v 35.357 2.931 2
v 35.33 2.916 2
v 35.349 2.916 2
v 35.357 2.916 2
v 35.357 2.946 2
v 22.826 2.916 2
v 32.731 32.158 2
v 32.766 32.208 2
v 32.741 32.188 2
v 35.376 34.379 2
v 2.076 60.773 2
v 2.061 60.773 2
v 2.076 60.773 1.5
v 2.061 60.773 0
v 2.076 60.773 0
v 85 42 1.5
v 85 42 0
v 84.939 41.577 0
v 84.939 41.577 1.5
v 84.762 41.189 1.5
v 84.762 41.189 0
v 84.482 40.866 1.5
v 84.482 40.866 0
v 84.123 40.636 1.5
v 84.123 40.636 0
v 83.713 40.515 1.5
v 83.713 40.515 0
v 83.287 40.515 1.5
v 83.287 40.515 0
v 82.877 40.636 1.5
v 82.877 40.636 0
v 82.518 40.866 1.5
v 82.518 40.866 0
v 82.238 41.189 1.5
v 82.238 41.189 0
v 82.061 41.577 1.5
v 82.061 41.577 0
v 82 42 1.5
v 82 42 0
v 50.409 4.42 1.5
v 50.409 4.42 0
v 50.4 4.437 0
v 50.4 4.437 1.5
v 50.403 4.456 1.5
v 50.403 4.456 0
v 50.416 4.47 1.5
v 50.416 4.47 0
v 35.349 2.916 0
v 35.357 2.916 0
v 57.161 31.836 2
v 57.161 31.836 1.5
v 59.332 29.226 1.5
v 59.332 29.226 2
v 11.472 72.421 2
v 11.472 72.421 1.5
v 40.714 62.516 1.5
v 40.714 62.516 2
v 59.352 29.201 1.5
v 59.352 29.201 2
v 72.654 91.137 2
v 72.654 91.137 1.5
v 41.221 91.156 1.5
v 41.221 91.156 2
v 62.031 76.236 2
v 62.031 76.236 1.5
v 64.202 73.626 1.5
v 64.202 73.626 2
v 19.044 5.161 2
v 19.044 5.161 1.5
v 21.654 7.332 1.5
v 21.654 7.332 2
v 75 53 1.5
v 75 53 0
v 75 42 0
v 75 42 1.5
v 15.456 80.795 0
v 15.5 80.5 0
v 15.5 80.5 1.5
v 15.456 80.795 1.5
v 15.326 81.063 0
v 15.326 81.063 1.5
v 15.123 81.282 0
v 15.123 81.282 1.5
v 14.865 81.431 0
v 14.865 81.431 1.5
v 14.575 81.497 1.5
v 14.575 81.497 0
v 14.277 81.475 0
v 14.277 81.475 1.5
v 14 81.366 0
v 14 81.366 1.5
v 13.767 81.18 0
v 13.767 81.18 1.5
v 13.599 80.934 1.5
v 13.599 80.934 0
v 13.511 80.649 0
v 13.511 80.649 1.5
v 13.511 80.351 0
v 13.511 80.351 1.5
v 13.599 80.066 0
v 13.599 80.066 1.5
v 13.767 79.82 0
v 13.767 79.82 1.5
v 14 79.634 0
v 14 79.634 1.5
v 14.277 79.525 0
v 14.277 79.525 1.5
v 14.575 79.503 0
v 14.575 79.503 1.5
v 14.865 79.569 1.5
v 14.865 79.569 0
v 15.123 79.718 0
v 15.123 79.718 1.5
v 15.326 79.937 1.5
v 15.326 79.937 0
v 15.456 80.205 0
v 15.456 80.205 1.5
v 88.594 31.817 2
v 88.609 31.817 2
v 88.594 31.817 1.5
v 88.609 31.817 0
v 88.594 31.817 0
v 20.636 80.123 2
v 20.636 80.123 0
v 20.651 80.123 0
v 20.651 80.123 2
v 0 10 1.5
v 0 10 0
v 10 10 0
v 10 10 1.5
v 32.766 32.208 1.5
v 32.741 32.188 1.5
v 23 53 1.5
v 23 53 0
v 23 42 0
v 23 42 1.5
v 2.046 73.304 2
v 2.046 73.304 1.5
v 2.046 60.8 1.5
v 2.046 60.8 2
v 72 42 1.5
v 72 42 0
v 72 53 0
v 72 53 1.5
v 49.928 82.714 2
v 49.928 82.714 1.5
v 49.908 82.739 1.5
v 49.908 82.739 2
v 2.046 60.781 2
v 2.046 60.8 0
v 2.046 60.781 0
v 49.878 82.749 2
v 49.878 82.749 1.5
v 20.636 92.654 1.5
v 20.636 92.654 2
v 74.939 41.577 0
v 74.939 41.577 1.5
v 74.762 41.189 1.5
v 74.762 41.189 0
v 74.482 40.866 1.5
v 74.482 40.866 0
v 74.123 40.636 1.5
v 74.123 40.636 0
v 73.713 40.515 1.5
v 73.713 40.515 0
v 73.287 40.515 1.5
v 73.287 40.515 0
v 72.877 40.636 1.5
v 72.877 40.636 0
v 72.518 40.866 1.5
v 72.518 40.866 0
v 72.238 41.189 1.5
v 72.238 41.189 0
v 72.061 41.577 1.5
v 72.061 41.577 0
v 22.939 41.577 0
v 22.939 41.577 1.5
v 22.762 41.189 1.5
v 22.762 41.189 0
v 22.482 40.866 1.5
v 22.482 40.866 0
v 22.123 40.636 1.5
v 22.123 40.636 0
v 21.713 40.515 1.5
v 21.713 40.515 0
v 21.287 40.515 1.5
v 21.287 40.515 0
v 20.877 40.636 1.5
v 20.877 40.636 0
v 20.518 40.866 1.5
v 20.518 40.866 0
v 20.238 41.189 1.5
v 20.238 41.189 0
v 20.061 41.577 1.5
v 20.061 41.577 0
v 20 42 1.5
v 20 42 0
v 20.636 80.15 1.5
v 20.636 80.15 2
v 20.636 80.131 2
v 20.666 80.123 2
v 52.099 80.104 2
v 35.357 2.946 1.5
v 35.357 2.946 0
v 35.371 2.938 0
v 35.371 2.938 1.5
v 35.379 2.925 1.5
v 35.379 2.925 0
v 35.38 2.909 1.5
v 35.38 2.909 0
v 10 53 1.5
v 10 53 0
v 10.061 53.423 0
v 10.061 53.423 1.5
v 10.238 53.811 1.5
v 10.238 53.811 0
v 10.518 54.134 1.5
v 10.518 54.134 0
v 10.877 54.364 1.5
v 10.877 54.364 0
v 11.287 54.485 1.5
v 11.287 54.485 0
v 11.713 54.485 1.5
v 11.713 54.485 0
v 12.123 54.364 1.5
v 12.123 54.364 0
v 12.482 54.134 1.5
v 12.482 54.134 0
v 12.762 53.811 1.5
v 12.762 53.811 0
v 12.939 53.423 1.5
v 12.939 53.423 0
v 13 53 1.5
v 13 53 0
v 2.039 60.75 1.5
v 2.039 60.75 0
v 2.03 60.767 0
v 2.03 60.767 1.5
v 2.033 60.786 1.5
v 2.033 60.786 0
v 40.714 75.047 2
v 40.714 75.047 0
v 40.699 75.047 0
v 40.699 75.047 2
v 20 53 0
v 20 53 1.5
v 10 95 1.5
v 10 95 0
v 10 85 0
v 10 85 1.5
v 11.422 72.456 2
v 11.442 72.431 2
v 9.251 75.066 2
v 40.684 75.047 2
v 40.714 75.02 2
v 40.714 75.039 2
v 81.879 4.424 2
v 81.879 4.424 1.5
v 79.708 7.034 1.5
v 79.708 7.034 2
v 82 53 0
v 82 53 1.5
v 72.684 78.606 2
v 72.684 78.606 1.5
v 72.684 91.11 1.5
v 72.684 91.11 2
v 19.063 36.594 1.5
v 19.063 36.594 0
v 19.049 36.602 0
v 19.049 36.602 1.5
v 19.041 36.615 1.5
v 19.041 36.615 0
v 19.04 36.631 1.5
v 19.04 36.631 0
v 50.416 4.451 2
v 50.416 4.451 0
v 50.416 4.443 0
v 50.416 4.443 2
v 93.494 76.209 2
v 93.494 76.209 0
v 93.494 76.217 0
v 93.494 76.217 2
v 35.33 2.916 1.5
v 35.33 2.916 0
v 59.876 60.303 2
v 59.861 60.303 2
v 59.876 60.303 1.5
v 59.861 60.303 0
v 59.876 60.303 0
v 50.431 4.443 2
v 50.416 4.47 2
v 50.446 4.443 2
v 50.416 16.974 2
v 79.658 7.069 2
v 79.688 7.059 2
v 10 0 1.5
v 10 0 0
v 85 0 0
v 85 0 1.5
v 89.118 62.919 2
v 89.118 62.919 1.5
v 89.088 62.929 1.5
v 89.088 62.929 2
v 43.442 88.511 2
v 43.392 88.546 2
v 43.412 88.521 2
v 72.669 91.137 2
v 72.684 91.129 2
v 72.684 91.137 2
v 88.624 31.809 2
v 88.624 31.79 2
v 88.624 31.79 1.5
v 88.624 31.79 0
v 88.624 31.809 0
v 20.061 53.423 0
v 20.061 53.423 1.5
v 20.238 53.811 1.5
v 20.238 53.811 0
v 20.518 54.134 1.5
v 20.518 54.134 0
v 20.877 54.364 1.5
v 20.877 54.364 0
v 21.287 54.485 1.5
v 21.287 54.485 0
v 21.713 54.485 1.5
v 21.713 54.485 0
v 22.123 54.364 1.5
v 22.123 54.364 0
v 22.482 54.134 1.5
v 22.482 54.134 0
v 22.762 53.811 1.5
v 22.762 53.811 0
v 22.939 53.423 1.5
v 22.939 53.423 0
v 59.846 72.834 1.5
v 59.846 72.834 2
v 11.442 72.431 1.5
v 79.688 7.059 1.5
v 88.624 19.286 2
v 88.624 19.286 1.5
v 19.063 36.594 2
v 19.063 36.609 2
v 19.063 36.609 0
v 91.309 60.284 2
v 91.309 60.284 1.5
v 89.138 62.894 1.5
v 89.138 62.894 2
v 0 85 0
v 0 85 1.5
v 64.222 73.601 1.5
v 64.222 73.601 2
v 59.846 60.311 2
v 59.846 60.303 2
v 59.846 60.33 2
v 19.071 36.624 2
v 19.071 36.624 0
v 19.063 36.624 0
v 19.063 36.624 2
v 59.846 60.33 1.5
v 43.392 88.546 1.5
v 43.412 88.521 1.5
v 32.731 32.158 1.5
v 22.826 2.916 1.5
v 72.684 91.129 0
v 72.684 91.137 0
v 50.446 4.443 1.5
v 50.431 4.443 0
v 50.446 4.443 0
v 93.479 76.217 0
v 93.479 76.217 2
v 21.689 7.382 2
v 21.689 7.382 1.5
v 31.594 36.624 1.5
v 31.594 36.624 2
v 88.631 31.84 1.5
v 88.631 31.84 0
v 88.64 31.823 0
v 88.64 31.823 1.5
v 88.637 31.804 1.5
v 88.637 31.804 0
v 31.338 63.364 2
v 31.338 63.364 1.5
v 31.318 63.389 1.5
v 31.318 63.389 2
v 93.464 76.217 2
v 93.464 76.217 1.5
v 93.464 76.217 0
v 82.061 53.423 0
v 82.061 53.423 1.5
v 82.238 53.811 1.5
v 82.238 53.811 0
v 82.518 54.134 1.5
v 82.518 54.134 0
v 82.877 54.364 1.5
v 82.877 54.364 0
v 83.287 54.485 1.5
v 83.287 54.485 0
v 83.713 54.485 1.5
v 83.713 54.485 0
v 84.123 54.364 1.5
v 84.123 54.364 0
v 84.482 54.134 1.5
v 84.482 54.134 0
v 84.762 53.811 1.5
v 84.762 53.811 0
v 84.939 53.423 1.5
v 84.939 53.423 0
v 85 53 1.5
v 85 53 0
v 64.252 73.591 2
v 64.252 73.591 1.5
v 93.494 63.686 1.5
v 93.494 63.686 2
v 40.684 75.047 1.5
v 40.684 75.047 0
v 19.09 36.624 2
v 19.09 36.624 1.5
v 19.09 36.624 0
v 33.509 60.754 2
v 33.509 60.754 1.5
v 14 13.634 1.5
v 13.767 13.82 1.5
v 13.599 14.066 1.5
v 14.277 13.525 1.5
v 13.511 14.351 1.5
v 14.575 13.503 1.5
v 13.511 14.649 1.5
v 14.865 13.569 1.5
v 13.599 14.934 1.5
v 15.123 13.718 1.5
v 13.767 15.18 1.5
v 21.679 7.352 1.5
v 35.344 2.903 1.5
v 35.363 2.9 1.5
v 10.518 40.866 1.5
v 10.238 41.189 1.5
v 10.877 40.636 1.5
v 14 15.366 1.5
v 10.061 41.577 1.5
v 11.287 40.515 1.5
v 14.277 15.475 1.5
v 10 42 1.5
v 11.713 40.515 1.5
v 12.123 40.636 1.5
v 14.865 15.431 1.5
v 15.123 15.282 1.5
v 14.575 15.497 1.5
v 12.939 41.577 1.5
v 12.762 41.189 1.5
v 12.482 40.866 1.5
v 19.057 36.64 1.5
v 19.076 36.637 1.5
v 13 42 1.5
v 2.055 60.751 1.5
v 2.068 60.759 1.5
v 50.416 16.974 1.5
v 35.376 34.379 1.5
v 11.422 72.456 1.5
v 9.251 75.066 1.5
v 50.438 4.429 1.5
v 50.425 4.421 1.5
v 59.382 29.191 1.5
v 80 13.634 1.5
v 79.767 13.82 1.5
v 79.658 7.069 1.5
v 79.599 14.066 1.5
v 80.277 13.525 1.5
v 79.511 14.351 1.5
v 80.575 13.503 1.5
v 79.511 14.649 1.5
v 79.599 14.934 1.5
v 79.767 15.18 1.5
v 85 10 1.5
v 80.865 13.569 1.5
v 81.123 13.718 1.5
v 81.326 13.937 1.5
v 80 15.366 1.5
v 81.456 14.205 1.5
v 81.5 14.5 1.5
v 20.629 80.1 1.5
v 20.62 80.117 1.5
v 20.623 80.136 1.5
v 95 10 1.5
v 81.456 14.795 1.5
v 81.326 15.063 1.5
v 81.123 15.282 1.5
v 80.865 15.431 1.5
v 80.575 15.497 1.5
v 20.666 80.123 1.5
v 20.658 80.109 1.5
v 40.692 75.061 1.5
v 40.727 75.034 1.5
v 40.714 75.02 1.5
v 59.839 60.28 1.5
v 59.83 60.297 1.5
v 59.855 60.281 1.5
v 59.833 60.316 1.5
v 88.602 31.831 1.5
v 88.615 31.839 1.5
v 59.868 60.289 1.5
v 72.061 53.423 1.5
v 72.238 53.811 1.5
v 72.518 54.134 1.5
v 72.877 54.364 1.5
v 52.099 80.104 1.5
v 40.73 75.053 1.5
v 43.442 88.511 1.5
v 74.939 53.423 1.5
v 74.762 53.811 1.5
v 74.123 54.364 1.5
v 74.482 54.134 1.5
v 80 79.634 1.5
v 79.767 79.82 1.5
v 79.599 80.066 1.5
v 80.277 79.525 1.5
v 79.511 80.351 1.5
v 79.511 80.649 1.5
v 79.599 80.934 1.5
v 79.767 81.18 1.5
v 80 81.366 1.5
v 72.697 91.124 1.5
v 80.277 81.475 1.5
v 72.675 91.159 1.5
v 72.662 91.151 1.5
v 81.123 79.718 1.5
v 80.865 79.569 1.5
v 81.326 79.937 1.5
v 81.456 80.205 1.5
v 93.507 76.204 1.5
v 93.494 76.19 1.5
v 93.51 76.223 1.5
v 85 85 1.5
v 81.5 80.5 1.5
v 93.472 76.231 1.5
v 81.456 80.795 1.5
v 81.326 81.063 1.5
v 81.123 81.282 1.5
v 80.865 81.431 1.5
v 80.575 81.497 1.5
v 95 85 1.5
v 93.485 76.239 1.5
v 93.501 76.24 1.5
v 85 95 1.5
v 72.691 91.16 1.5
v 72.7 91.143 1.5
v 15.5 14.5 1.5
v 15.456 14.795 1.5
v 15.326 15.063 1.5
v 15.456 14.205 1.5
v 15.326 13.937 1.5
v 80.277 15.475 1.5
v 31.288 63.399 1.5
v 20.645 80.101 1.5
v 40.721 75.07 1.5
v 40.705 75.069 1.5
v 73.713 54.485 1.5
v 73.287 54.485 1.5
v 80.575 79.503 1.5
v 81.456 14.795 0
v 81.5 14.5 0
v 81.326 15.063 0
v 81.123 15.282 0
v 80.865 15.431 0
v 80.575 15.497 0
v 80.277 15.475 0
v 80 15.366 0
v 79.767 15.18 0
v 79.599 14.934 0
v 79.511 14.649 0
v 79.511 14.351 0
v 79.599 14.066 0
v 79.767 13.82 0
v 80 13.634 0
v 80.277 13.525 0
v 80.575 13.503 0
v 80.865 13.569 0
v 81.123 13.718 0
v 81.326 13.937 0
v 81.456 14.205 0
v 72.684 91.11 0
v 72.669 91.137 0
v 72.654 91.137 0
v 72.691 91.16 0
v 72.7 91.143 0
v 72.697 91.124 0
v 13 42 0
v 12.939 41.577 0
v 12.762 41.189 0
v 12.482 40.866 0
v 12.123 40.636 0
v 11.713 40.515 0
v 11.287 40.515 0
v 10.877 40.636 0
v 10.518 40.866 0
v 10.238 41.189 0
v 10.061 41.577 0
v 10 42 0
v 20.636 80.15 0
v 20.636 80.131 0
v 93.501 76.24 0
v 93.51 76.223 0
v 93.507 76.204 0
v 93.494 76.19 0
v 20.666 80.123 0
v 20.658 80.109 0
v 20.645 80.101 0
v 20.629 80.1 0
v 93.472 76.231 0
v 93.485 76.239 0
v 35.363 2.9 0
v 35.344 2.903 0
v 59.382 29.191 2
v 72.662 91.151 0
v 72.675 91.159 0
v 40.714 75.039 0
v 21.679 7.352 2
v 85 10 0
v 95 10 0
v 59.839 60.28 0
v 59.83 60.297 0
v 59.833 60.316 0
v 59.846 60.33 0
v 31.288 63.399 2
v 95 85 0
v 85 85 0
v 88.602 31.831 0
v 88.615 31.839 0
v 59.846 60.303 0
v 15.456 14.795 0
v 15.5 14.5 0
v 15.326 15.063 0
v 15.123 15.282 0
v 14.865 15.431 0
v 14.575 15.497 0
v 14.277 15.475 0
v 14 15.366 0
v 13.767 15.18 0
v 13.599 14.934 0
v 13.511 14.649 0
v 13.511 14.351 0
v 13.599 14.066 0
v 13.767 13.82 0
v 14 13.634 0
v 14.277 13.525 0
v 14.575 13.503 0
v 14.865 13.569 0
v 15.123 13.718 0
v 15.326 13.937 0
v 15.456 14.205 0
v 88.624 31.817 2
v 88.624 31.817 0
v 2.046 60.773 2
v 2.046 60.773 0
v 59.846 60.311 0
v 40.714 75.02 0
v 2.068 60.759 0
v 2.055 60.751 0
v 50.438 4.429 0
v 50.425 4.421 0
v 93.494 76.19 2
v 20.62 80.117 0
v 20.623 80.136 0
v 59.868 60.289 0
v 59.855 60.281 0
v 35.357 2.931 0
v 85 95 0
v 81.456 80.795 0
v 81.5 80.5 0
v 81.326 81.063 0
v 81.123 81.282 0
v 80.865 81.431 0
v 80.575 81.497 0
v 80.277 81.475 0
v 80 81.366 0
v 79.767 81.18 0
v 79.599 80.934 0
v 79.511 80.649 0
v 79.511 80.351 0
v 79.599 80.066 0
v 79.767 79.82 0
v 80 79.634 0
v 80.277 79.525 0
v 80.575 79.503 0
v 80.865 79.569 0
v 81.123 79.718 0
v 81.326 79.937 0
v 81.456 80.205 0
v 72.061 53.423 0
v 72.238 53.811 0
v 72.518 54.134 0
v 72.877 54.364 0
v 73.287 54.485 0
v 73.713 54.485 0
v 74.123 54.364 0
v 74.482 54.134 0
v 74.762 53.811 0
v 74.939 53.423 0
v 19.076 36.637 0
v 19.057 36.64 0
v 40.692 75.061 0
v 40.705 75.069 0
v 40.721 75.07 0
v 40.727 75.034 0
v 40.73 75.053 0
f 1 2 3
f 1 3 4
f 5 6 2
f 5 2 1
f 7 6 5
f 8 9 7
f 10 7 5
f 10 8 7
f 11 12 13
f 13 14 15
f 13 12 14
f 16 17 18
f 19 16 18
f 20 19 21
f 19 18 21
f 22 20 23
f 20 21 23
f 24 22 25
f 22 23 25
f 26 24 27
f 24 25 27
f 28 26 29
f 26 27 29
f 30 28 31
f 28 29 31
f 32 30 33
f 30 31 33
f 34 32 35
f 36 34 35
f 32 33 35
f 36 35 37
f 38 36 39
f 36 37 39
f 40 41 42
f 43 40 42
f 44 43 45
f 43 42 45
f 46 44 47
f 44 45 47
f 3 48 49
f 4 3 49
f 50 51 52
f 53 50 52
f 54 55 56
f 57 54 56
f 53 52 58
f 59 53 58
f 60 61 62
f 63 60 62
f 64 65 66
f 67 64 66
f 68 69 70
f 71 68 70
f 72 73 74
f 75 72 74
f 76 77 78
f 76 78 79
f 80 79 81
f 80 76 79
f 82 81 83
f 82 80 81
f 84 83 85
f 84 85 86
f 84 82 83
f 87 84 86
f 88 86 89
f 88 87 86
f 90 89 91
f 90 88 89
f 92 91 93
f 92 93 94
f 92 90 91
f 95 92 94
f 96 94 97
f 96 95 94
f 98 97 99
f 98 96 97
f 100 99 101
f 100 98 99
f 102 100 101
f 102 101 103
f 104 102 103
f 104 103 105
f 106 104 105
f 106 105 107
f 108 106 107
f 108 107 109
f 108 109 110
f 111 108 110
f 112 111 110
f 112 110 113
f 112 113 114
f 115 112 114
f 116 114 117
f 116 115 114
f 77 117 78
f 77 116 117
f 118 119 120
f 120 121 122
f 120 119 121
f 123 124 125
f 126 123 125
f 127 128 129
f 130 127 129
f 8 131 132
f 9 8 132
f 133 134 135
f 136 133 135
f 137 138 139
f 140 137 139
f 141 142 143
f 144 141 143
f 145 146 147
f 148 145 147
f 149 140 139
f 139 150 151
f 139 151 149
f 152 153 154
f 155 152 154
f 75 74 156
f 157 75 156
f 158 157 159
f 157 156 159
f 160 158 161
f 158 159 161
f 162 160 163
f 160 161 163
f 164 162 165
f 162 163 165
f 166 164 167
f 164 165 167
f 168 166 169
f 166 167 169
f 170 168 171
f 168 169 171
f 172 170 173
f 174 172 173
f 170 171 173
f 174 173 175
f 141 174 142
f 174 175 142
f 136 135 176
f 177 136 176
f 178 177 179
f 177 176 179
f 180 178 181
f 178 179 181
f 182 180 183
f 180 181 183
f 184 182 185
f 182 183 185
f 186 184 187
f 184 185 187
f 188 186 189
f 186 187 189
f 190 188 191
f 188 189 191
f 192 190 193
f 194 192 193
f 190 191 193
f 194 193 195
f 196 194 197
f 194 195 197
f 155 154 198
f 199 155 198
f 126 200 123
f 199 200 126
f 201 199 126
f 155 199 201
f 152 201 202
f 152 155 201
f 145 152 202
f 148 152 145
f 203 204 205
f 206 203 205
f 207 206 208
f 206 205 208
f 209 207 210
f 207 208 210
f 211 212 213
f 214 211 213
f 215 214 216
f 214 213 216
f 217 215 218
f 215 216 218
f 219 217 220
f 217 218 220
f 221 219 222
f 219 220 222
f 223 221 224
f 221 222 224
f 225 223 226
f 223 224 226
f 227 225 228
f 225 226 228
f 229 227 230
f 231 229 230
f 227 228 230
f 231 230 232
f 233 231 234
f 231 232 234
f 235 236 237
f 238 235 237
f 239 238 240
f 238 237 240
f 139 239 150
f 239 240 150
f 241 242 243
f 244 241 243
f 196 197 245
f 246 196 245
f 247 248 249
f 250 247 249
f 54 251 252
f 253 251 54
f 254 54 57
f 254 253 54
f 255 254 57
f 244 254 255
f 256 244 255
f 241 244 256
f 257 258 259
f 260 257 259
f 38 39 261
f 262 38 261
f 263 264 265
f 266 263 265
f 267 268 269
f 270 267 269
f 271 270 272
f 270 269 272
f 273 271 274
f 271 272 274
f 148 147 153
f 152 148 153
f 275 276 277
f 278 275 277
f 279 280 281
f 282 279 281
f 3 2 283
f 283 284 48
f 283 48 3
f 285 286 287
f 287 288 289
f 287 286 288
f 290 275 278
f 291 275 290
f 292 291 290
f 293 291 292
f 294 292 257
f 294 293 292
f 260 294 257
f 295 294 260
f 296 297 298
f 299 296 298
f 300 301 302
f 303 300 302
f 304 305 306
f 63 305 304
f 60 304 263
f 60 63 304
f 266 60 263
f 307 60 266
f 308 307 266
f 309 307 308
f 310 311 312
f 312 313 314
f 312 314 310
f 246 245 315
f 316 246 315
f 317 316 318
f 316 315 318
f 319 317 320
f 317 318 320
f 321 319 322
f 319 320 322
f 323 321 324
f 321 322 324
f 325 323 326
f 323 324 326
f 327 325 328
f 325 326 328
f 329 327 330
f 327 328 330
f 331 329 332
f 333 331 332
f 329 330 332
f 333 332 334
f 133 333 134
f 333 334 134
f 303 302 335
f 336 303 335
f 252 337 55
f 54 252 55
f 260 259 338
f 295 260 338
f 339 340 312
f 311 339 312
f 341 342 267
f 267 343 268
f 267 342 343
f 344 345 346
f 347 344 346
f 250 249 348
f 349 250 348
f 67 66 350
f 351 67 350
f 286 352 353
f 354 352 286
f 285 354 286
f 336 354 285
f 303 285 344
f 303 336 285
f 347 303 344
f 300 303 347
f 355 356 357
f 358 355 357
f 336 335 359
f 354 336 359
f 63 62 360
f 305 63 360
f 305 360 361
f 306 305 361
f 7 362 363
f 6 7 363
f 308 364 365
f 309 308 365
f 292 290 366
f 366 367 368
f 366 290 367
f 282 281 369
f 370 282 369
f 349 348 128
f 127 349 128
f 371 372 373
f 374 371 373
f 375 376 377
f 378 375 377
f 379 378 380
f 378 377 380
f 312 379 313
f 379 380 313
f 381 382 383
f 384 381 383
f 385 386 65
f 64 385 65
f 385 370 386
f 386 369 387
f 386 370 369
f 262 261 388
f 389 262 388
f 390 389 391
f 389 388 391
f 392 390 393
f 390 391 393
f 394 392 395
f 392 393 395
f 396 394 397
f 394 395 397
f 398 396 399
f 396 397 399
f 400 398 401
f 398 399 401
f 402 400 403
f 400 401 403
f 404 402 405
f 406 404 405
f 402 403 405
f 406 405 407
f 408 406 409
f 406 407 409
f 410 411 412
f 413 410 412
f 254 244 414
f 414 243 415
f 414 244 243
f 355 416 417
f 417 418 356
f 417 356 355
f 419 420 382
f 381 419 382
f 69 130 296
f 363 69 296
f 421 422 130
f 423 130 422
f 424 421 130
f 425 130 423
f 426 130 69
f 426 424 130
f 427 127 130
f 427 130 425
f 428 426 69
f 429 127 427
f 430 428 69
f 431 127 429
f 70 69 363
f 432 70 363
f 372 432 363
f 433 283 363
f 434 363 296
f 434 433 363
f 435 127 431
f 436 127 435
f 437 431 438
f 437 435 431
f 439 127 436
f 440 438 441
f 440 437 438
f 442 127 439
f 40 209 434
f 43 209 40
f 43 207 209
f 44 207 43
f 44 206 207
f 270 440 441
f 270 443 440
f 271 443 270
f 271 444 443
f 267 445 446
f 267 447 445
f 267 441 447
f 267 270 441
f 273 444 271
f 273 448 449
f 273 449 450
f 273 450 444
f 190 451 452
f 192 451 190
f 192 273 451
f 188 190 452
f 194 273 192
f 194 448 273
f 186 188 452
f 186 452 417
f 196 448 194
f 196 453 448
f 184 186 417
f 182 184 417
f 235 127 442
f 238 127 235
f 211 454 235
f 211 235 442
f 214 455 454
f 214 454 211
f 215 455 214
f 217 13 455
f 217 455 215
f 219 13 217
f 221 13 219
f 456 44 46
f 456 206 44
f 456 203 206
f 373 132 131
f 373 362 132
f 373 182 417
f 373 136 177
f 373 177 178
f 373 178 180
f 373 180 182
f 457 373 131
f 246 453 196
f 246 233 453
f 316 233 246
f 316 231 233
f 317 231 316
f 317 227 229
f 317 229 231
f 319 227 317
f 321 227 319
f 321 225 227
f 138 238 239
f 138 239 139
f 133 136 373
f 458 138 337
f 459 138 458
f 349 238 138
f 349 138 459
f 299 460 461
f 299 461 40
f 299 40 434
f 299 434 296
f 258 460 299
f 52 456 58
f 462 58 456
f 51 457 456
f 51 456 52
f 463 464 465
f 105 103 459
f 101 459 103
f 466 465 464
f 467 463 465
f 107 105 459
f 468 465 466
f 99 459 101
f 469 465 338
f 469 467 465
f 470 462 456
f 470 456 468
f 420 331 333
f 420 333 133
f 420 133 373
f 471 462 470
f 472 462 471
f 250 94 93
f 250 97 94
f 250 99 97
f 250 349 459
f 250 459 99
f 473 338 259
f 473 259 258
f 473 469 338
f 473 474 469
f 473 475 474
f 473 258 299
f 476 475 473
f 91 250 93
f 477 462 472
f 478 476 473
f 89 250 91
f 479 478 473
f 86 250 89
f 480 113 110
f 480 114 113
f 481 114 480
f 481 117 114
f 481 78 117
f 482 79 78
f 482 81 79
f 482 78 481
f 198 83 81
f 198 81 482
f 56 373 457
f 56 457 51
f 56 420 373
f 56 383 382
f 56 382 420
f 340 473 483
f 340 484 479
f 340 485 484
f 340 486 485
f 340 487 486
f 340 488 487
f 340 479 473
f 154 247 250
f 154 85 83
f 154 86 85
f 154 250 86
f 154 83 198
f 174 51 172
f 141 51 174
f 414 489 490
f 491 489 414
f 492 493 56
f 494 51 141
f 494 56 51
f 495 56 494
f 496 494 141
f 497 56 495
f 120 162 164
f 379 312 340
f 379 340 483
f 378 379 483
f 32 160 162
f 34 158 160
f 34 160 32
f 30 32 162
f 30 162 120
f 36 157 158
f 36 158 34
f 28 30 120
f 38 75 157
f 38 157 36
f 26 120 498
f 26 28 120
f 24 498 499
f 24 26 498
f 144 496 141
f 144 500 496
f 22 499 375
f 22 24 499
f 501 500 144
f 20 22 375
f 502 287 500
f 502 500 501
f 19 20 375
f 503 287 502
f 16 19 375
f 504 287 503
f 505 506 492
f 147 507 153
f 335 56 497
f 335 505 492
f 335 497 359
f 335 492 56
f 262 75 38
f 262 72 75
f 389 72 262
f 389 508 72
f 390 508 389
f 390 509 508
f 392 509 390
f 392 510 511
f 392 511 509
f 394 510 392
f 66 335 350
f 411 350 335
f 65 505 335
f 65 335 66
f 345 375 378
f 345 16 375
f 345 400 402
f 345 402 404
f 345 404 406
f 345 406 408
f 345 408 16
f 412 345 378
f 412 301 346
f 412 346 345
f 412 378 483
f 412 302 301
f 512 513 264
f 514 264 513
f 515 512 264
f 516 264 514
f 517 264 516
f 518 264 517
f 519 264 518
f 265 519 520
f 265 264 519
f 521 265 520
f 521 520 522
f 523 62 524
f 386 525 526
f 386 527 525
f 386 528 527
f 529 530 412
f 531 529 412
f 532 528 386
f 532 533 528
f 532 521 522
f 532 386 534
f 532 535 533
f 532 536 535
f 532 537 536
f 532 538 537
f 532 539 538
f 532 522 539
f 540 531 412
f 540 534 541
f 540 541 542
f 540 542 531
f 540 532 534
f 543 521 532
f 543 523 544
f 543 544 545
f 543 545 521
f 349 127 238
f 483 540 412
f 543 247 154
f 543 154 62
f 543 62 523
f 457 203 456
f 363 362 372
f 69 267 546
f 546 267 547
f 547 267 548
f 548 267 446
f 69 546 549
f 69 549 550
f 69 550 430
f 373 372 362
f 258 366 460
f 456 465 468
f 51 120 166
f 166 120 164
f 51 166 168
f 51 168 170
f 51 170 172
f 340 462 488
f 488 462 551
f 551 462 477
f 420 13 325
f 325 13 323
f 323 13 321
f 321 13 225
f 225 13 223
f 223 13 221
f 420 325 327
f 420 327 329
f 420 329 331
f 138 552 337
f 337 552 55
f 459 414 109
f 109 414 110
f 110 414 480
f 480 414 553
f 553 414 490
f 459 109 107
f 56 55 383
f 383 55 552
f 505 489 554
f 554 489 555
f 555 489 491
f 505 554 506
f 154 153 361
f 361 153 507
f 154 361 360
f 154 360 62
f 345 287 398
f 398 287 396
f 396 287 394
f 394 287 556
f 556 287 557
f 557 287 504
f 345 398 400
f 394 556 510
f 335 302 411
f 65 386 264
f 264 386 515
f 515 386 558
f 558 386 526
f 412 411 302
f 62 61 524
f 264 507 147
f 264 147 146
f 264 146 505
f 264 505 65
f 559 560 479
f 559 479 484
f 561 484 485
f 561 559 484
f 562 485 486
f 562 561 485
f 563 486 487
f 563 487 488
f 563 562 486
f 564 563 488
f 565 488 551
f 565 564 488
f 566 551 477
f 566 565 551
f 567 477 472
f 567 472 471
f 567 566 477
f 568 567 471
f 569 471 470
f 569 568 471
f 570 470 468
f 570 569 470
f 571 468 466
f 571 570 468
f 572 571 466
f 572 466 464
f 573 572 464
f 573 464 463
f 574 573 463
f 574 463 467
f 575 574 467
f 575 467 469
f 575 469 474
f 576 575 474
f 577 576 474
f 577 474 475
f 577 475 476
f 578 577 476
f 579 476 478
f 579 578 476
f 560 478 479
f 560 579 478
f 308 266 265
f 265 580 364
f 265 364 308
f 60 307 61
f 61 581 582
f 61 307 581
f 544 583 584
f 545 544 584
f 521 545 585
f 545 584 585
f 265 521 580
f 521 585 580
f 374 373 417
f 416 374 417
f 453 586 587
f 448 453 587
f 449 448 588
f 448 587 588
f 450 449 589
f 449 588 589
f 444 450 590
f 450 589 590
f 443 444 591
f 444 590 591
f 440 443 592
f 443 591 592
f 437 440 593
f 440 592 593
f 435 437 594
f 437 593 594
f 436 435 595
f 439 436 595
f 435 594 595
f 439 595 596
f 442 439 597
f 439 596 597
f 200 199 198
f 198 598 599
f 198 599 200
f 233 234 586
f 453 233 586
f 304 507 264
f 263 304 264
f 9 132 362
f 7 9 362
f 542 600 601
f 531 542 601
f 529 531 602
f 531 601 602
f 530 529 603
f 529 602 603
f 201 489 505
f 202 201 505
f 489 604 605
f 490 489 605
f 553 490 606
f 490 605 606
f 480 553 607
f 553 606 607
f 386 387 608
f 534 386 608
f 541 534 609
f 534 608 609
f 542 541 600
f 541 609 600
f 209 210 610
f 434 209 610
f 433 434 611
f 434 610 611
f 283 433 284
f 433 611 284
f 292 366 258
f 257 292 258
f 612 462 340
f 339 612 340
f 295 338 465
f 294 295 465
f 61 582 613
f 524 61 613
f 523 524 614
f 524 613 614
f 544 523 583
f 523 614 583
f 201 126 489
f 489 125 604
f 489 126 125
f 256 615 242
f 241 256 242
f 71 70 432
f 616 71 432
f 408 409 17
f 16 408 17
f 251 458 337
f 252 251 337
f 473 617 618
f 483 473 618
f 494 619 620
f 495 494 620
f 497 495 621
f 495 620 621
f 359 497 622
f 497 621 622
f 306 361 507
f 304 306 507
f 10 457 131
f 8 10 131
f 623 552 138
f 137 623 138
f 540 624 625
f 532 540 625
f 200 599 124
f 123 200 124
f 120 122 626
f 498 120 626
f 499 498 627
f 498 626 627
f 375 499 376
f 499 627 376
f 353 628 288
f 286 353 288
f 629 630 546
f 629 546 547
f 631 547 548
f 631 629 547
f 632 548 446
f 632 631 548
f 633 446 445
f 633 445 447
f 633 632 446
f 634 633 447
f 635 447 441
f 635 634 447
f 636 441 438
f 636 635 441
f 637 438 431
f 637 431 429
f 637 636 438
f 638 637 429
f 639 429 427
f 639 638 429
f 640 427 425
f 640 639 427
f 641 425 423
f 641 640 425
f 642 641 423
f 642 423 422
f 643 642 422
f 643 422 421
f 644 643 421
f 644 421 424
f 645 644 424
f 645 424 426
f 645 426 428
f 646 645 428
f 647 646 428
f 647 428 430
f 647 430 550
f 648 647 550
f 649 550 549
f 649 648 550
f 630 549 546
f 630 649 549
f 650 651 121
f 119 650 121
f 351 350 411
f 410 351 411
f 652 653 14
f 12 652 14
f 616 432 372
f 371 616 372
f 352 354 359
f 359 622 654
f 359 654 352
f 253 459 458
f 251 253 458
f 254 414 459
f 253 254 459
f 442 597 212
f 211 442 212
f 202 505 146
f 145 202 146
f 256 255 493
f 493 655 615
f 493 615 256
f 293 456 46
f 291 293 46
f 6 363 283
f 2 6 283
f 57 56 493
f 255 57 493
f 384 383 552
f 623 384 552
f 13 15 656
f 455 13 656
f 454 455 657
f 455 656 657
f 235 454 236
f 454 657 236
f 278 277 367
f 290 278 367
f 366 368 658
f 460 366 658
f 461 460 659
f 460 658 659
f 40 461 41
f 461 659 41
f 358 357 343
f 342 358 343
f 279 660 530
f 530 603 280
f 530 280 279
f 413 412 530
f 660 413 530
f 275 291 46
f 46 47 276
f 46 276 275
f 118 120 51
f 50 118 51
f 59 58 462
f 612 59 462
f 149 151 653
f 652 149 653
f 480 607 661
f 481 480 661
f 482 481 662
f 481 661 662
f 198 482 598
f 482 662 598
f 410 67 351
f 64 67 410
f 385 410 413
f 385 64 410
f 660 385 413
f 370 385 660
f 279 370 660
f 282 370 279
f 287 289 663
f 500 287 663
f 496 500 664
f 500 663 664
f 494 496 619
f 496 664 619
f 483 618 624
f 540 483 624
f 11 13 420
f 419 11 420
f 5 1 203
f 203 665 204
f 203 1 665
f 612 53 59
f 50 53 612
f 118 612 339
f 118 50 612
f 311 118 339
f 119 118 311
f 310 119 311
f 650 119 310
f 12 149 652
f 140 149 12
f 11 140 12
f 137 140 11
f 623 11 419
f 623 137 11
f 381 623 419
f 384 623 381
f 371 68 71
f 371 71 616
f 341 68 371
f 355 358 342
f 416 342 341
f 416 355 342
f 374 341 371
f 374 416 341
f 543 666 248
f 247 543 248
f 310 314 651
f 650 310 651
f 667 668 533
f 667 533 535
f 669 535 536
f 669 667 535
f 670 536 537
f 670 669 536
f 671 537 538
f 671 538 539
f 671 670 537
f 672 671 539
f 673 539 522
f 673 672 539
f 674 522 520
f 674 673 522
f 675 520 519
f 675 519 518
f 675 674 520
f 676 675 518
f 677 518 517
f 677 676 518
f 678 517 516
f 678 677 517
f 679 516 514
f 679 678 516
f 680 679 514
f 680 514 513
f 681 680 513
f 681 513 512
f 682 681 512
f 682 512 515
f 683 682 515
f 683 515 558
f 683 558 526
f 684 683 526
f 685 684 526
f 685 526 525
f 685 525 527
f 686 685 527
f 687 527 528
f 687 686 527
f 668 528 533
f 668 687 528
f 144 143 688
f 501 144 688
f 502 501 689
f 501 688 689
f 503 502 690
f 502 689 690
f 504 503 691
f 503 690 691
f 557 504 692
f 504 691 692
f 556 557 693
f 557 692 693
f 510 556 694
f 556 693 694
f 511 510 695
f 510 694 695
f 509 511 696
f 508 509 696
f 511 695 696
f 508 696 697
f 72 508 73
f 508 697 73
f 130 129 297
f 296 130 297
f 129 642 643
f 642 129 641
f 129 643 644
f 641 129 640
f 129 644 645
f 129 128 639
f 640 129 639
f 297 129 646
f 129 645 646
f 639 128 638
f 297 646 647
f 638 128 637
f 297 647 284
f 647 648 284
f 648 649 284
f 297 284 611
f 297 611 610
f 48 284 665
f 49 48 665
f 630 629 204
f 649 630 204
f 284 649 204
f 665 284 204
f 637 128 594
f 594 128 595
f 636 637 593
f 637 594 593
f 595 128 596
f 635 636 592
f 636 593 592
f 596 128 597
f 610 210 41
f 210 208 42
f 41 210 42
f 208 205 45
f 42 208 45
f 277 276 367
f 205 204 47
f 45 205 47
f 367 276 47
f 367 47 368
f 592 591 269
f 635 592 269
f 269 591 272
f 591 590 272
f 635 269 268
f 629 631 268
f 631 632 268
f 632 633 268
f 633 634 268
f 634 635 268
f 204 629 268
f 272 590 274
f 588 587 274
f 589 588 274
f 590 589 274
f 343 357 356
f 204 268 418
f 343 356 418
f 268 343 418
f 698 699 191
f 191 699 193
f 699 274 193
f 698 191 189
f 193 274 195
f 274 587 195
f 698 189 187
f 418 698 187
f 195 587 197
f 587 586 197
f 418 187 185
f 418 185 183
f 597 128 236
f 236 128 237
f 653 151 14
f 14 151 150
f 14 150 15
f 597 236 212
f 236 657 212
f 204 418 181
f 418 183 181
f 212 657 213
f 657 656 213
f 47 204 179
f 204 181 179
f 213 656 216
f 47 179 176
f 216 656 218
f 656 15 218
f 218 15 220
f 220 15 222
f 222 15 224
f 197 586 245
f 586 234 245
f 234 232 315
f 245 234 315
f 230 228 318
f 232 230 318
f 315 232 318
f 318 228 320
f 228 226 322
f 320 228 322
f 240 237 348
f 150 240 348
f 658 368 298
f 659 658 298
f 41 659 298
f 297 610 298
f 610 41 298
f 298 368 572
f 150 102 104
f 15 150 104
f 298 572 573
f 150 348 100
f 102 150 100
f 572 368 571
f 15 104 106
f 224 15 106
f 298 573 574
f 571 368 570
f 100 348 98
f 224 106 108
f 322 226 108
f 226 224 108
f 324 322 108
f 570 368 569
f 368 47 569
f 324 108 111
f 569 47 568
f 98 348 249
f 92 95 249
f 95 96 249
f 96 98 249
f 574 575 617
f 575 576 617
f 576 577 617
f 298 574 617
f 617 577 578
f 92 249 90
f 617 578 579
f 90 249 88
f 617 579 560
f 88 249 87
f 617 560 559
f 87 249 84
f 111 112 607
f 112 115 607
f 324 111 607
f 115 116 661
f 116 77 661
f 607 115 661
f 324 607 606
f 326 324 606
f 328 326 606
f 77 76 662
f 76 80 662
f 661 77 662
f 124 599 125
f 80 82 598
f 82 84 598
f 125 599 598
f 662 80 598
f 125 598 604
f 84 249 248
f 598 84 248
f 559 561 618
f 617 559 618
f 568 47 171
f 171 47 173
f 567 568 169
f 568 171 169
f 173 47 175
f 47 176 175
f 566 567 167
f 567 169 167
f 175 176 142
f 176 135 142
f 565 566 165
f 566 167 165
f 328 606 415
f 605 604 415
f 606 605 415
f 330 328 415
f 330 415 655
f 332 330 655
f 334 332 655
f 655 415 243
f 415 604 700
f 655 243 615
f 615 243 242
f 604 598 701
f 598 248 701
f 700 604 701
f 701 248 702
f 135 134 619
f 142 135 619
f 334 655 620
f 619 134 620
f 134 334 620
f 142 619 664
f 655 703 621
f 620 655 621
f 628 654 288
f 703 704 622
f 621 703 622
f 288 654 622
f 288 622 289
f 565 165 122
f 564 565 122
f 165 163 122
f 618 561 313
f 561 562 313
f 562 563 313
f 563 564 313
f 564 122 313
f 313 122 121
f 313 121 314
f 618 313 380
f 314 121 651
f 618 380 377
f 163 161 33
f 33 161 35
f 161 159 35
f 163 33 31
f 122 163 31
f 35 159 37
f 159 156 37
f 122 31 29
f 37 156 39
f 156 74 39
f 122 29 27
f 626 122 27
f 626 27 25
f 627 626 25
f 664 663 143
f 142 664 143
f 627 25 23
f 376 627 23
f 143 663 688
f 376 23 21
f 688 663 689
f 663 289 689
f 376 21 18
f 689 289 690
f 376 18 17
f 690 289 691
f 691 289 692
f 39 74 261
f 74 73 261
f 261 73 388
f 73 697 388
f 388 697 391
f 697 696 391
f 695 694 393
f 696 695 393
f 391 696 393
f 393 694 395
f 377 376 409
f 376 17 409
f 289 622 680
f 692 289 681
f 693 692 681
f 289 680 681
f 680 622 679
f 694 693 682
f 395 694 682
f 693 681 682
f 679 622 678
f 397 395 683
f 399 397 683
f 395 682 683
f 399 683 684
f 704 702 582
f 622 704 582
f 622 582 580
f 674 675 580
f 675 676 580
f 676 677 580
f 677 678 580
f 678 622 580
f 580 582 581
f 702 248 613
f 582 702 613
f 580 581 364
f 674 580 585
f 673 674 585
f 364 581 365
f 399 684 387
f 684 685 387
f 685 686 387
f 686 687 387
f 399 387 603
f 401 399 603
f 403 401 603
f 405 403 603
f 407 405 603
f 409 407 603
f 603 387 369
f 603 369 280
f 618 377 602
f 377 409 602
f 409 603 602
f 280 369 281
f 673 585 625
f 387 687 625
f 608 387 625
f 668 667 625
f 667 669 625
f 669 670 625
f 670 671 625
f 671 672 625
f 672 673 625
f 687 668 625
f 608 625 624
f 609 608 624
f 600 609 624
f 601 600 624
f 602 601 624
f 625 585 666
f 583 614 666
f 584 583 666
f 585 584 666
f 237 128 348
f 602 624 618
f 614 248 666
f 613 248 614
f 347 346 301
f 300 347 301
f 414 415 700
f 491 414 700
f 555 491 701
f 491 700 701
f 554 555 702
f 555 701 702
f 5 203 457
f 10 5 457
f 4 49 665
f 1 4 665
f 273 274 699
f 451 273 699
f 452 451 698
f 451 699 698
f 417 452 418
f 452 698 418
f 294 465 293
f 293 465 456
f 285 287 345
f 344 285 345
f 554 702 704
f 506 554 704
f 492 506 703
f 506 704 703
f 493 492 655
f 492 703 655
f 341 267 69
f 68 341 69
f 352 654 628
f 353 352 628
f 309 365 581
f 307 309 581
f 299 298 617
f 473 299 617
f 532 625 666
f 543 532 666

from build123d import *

# Parameters (mm, degrees)
BOSS_EXTRUDE3_DEPTH     = 2
BOSS_EXTRUDE3_2_DEPTH   = 2
BOSS_EXTRUDE3_3_DEPTH   = 2
BOSS_EXTRUDE3_4_DEPTH   = 2
BOSS_EXTRUDE3_5_DEPTH   = 2
BOSS_EXTRUDE3_6_DEPTH   = 2
BOSS_EXTRUDE3_7_DEPTH   = 2
BOSS_EXTRUDE3_8_DEPTH   = 2
BOSS_EXTRUDE3_9_DEPTH   = 2
BOSS_EXTRUDE3_10_DEPTH  = 2
BOSS_EXTRUDE4_OUTLINE_R = 1
BOSS_EXTRUDE4_DEPTH     = 1.5


# Read off the part's stored shape, not the designer's step: Boss-Extrude4
with BuildPart() as part:
    # Model → Boss-Extrude3 (new body)
    with BuildSketch(Plane.XY):
        Polygon((59.84570046, 60.330296093), (59.8457, 60.3111), (59.8457, 60.3027), (59.8613, 60.3027), (59.876264405, 60.302691244), (91.309, 60.2843), (89.13842206, 62.894165109), (89.1181, 62.9186), (89.088037471, 62.928783041), (59.846, 72.8339), align=None)
    extrude(amount=BOSS_EXTRUDE3_DEPTH)



with BuildPart() as body_2:
    # Model → Boss-Extrude3 2 (new body)
    with BuildSketch(Plane.XY):
        Polygon((93.49429954, 76.189703907), (93.4943, 76.2089), (93.4943, 76.2173), (93.4787, 76.2173), (93.463735595, 76.217308756), (62.031, 76.2357), (64.20157794, 73.625834891), (64.2219, 73.6014), (64.251962529, 73.591216959), (93.494, 63.6861), align=None)
    extrude(amount=BOSS_EXTRUDE3_2_DEPTH)


with BuildPart() as body_3:
    # Model → Boss-Extrude3 3 (new body)
    with BuildSketch(Plane.XY):
        Polygon((72.68429954, 91.109703907), (72.6843, 91.1289), (72.6843, 91.1373), (72.6687, 91.1373), (72.653735595, 91.137308756), (41.221, 91.1557), (43.39157794, 88.545834891), (43.4119, 88.5214), (43.441962529, 88.511216959), (72.684, 78.6061), align=None)
    extrude(amount=BOSS_EXTRUDE3_3_DEPTH)


with BuildPart() as body_4:
    # Model → Boss-Extrude3 4 (new body)
    with BuildSketch(Plane.XY):
        Polygon((20.63570046, 80.150296093), (20.6357, 80.1311), (20.6357, 80.1227), (20.6513, 80.1227), (20.666264405, 80.122691244), (52.099, 80.1043), (49.92842206, 82.714165109), (49.9081, 82.7386), (49.878037471, 82.748783041), (20.636, 92.6539), align=None)
    extrude(amount=BOSS_EXTRUDE3_4_DEPTH)


with BuildPart() as body_5:
    # Model → Boss-Extrude3 5 (new body)
    with BuildSketch(Plane.XY):
        Polygon((40.7143, 75.0473), (40.6987, 75.0473), (40.683735595, 75.047308756), (9.251, 75.0657), (11.42157794, 72.455834891), (11.4419, 72.4314), (11.471962529, 72.421216959), (40.714, 62.5161), (40.71429954, 75.019703907), (40.7143, 75.0389), align=None)
    extrude(amount=BOSS_EXTRUDE3_5_DEPTH)


with BuildPart() as body_6:
    # Model → Boss-Extrude3 6 (new body)
    with BuildSketch(Plane.XY):
        Polygon((2.04570046, 60.800296093), (2.0457, 60.7811), (2.0457, 60.7727), (2.0613, 60.7727), (2.076264405, 60.772691244), (33.509, 60.7543), (31.33842206, 63.364165109), (31.3181, 63.3886), (31.288037471, 63.398783041), (2.046, 73.3039), align=None)
    extrude(amount=BOSS_EXTRUDE3_6_DEPTH)


with BuildPart() as body_7:
    # Model → Boss-Extrude3 7 (new body)
    with BuildSketch(Plane.XY):
        Polygon((19.090296093, 36.62429954), (19.0711, 36.6243), (19.0627, 36.6243), (19.0627, 36.6087), (19.062691244, 36.593735595), (19.0443, 5.161), (21.654165109, 7.33157794), (21.6786, 7.3519), (21.688783041, 7.381962529), (31.5939, 36.624), align=None)
    extrude(amount=BOSS_EXTRUDE3_7_DEPTH)


with BuildPart() as body_8:
    # Model → Boss-Extrude3 8 (new body)
    with BuildSketch(Plane.XY):
        Polygon((35.3573, 2.9157), (35.3573, 2.9313), (35.357308756, 2.946264405), (35.3757, 34.379), (32.765834891, 32.20842206), (32.7414, 32.1881), (32.731216959, 32.158037471), (22.8261, 2.916), (35.329703907, 2.91570046), (35.3489, 2.9157), align=None)
    extrude(amount=BOSS_EXTRUDE3_8_DEPTH)


with BuildPart() as body_9:
    # Model → Boss-Extrude3 9 (new body)
    with BuildSketch(Plane.XY):
        Polygon((50.41570046, 4.470296093), (50.4157, 4.4511), (50.4157, 4.4427), (50.4313, 4.4427), (50.446264405, 4.442691244), (81.879, 4.4243), (79.70842206, 7.034165109), (79.6881, 7.0586), (79.658037471, 7.068783041), (50.416, 16.9739), align=None)
    extrude(amount=BOSS_EXTRUDE3_9_DEPTH)


with BuildPart() as body_10:
    # Model → Boss-Extrude3 10 (new body)
    with BuildSketch(Plane.XY):
        Polygon((88.62429954, 31.789703907), (88.6243, 31.8089), (88.6243, 31.8173), (88.6087, 31.8173), (88.593735595, 31.817308756), (57.161, 31.8357), (59.33157794, 29.225834891), (59.3519, 29.2014), (59.381962529, 29.191216959), (88.624, 19.2861), align=None)
    extrude(amount=BOSS_EXTRUDE3_10_DEPTH)


with BuildPart() as part_1:
    add(part.part)

    add(body_2.part)  # Boss-Extrude4 merges body 2

    add(body_3.part)  # Boss-Extrude4 merges body 3

    add(body_4.part)  # Boss-Extrude4 merges body 4

    add(body_5.part)  # Boss-Extrude4 merges body 5

    add(body_6.part)  # Boss-Extrude4 merges body 6

    add(body_7.part)  # Boss-Extrude4 merges body 7

    add(body_8.part)  # Boss-Extrude4 merges body 8

    add(body_9.part)  # Boss-Extrude4 merges body 9

    add(body_10.part)  # Boss-Extrude4 merges body 10
    # Boss-Extrude4 outline → Boss-Extrude4 (add)
    with BuildSketch(Plane.XY):
        Polygon((10, 85), (0, 85), (0, 10), (10, 10), (10, 0), (85, 0), (85, 10), (95, 10), (95, 85), (85, 85), (85, 95), (10, 95), align=None)
        with Locations((14.5, 14.5)):
            Circle(BOSS_EXTRUDE4_OUTLINE_R, mode=Mode.SUBTRACT)
        with BuildLine():
            Line((35.3757, 34.379), (35.357308756, 2.946264405))
            ThreePointArc((35.357308756, 2.946264405), (35.375994273, 2.93215571), (35.379898885, 2.909069831))
            ThreePointArc((35.379898885, 2.909069831), (35.353148575, 2.899873011), (35.329703907, 2.91570046))
            Line((35.329703907, 2.91570046), (22.8261, 2.916))
            Line((22.8261, 2.916), (32.7414, 32.1881))
            Line((32.7414, 32.1881), (35.3757, 34.379))
        make_face(mode=Mode.SUBTRACT)
        with BuildLine():
            Line((19.0443, 5.161), (19.062691244, 36.593735595))
            ThreePointArc((19.062691244, 36.593735595), (19.044005727, 36.60784429), (19.040101115, 36.630930169))
            ThreePointArc((19.040101115, 36.630930169), (19.066851425, 36.640126989), (19.090296093, 36.62429954))
            Line((19.090296093, 36.62429954), (31.5939, 36.624))
            Line((31.5939, 36.624), (21.6786, 7.3519))
            Line((21.6786, 7.3519), (19.0443, 5.161))
        make_face(mode=Mode.SUBTRACT)
        with BuildLine():
            Line((81.879, 4.4243), (50.446264405, 4.442691244))
            ThreePointArc((50.446264405, 4.442691244), (50.43215571, 4.424005727), (50.409069831, 4.420101115))
            ThreePointArc((50.409069831, 4.420101115), (50.399873011, 4.446851425), (50.41570046, 4.470296093))
            Line((50.41570046, 4.470296093), (50.416, 16.9739))
            Line((50.416, 16.9739), (79.6881, 7.0586))
            Line((79.6881, 7.0586), (81.879, 4.4243))
        make_face(mode=Mode.SUBTRACT)
        with Locations((80.5, 14.5)):
            Circle(BOSS_EXTRUDE4_OUTLINE_R, mode=Mode.SUBTRACT)
        with BuildLine():
            Line((57.161, 31.8357), (88.593735595, 31.817308756))
            ThreePointArc((88.593735595, 31.817308756), (88.60784429, 31.835994273), (88.630930169, 31.839898885))
            ThreePointArc((88.630930169, 31.839898885), (88.640126989, 31.813148575), (88.62429954, 31.789703907))
            Line((88.62429954, 31.789703907), (88.624, 19.2861))
            Line((88.624, 19.2861), (59.3519, 29.2014))
            Line((59.3519, 29.2014), (57.161, 31.8357))
        make_face(mode=Mode.SUBTRACT)
        with BuildLine():
            Line((10, 42), (10, 53))
            ThreePointArc((10, 53), (11.5, 54.5), (13, 53))
            Line((13, 53), (13, 42))
            ThreePointArc((13, 42), (11.5, 40.5), (10, 42))
        make_face(mode=Mode.SUBTRACT)
        with BuildLine():
            Line((20, 42), (20, 53))
            ThreePointArc((20, 53), (21.5, 54.5), (23, 53))
            Line((23, 53), (23, 42))
            ThreePointArc((23, 42), (21.5, 40.5), (20, 42))
        make_face(mode=Mode.SUBTRACT)
        with BuildLine():
            Line((33.509, 60.7543), (2.076264405, 60.772691244))
            ThreePointArc((2.076264405, 60.772691244), (2.06215571, 60.754005727), (2.039069831, 60.750101115))
            ThreePointArc((2.039069831, 60.750101115), (2.029873011, 60.776851425), (2.04570046, 60.800296093))
            Line((2.04570046, 60.800296093), (2.046, 73.3039))
            Line((2.046, 73.3039), (31.3181, 63.3886))
            Line((31.3181, 63.3886), (33.509, 60.7543))
        make_face(mode=Mode.SUBTRACT)
        with BuildLine():
            Line((9.251, 75.0657), (40.683735595, 75.047308756))
            ThreePointArc((40.683735595, 75.047308756), (40.69784429, 75.065994273), (40.720930169, 75.069898885))
            ThreePointArc((40.720930169, 75.069898885), (40.730126989, 75.043148575), (40.71429954, 75.019703907))
            Line((40.71429954, 75.019703907), (40.714, 62.5161))
            Line((40.714, 62.5161), (11.4419, 72.4314))
            Line((11.4419, 72.4314), (9.251, 75.0657))
        make_face(mode=Mode.SUBTRACT)
        with Locations((14.5, 80.5)):
            Circle(BOSS_EXTRUDE4_OUTLINE_R, mode=Mode.SUBTRACT)
        with BuildLine():
            Line((52.099, 80.1043), (20.666264405, 80.122691244))
            ThreePointArc((20.666264405, 80.122691244), (20.65215571, 80.104005727), (20.629069831, 80.100101115))
            ThreePointArc((20.629069831, 80.100101115), (20.619873011, 80.126851425), (20.63570046, 80.150296093))
            Line((20.63570046, 80.150296093), (20.636, 92.6539))
            Line((20.636, 92.6539), (49.9081, 82.7386))
            Line((49.9081, 82.7386), (52.099, 80.1043))
        make_face(mode=Mode.SUBTRACT)
        with BuildLine():
            Line((72, 42), (72, 53))
            ThreePointArc((72, 53), (73.5, 54.5), (75, 53))
            Line((75, 53), (75, 42))
            ThreePointArc((75, 42), (73.5, 40.5), (72, 42))
        make_face(mode=Mode.SUBTRACT)
        with BuildLine():
            Line((82, 42), (82, 53))
            ThreePointArc((82, 53), (83.5, 54.5), (85, 53))
            Line((85, 53), (85, 42))
            ThreePointArc((85, 42), (83.5, 40.5), (82, 42))
        make_face(mode=Mode.SUBTRACT)
        with BuildLine():
            Line((91.309, 60.2843), (59.876264405, 60.302691244))
            ThreePointArc((59.876264405, 60.302691244), (59.86215571, 60.284005727), (59.839069831, 60.280101115))
            ThreePointArc((59.839069831, 60.280101115), (59.829873011, 60.306851425), (59.84570046, 60.330296093))
            Line((59.84570046, 60.330296093), (59.846, 72.8339))
            Line((59.846, 72.8339), (89.1181, 62.9186))
            Line((89.1181, 62.9186), (91.309, 60.2843))
        make_face(mode=Mode.SUBTRACT)
        with BuildLine():
            Line((62.031, 76.2357), (93.463735595, 76.217308756))
            ThreePointArc((93.463735595, 76.217308756), (93.47784429, 76.235994273), (93.500930169, 76.239898885))
            ThreePointArc((93.500930169, 76.239898885), (93.510126989, 76.213148575), (93.49429954, 76.189703907))
            Line((93.49429954, 76.189703907), (93.494, 63.6861))
            Line((93.494, 63.6861), (64.2219, 73.6014))
            Line((64.2219, 73.6014), (62.031, 76.2357))
        make_face(mode=Mode.SUBTRACT)
        with BuildLine():
            Line((41.221, 91.1557), (72.653735595, 91.137308756))
            ThreePointArc((72.653735595, 91.137308756), (72.66784429, 91.155994273), (72.690930169, 91.159898885))
            ThreePointArc((72.690930169, 91.159898885), (72.700126989, 91.133148575), (72.68429954, 91.109703907))
            Line((72.68429954, 91.109703907), (72.684, 78.6061))
            Line((72.684, 78.6061), (43.4119, 88.5214))
            Line((43.4119, 88.5214), (41.221, 91.1557))
        make_face(mode=Mode.SUBTRACT)
        with Locations((80.5, 80.5)):
            Circle(BOSS_EXTRUDE4_OUTLINE_R, mode=Mode.SUBTRACT)
    extrude(amount=BOSS_EXTRUDE4_DEPTH)


solid = part_1.part
